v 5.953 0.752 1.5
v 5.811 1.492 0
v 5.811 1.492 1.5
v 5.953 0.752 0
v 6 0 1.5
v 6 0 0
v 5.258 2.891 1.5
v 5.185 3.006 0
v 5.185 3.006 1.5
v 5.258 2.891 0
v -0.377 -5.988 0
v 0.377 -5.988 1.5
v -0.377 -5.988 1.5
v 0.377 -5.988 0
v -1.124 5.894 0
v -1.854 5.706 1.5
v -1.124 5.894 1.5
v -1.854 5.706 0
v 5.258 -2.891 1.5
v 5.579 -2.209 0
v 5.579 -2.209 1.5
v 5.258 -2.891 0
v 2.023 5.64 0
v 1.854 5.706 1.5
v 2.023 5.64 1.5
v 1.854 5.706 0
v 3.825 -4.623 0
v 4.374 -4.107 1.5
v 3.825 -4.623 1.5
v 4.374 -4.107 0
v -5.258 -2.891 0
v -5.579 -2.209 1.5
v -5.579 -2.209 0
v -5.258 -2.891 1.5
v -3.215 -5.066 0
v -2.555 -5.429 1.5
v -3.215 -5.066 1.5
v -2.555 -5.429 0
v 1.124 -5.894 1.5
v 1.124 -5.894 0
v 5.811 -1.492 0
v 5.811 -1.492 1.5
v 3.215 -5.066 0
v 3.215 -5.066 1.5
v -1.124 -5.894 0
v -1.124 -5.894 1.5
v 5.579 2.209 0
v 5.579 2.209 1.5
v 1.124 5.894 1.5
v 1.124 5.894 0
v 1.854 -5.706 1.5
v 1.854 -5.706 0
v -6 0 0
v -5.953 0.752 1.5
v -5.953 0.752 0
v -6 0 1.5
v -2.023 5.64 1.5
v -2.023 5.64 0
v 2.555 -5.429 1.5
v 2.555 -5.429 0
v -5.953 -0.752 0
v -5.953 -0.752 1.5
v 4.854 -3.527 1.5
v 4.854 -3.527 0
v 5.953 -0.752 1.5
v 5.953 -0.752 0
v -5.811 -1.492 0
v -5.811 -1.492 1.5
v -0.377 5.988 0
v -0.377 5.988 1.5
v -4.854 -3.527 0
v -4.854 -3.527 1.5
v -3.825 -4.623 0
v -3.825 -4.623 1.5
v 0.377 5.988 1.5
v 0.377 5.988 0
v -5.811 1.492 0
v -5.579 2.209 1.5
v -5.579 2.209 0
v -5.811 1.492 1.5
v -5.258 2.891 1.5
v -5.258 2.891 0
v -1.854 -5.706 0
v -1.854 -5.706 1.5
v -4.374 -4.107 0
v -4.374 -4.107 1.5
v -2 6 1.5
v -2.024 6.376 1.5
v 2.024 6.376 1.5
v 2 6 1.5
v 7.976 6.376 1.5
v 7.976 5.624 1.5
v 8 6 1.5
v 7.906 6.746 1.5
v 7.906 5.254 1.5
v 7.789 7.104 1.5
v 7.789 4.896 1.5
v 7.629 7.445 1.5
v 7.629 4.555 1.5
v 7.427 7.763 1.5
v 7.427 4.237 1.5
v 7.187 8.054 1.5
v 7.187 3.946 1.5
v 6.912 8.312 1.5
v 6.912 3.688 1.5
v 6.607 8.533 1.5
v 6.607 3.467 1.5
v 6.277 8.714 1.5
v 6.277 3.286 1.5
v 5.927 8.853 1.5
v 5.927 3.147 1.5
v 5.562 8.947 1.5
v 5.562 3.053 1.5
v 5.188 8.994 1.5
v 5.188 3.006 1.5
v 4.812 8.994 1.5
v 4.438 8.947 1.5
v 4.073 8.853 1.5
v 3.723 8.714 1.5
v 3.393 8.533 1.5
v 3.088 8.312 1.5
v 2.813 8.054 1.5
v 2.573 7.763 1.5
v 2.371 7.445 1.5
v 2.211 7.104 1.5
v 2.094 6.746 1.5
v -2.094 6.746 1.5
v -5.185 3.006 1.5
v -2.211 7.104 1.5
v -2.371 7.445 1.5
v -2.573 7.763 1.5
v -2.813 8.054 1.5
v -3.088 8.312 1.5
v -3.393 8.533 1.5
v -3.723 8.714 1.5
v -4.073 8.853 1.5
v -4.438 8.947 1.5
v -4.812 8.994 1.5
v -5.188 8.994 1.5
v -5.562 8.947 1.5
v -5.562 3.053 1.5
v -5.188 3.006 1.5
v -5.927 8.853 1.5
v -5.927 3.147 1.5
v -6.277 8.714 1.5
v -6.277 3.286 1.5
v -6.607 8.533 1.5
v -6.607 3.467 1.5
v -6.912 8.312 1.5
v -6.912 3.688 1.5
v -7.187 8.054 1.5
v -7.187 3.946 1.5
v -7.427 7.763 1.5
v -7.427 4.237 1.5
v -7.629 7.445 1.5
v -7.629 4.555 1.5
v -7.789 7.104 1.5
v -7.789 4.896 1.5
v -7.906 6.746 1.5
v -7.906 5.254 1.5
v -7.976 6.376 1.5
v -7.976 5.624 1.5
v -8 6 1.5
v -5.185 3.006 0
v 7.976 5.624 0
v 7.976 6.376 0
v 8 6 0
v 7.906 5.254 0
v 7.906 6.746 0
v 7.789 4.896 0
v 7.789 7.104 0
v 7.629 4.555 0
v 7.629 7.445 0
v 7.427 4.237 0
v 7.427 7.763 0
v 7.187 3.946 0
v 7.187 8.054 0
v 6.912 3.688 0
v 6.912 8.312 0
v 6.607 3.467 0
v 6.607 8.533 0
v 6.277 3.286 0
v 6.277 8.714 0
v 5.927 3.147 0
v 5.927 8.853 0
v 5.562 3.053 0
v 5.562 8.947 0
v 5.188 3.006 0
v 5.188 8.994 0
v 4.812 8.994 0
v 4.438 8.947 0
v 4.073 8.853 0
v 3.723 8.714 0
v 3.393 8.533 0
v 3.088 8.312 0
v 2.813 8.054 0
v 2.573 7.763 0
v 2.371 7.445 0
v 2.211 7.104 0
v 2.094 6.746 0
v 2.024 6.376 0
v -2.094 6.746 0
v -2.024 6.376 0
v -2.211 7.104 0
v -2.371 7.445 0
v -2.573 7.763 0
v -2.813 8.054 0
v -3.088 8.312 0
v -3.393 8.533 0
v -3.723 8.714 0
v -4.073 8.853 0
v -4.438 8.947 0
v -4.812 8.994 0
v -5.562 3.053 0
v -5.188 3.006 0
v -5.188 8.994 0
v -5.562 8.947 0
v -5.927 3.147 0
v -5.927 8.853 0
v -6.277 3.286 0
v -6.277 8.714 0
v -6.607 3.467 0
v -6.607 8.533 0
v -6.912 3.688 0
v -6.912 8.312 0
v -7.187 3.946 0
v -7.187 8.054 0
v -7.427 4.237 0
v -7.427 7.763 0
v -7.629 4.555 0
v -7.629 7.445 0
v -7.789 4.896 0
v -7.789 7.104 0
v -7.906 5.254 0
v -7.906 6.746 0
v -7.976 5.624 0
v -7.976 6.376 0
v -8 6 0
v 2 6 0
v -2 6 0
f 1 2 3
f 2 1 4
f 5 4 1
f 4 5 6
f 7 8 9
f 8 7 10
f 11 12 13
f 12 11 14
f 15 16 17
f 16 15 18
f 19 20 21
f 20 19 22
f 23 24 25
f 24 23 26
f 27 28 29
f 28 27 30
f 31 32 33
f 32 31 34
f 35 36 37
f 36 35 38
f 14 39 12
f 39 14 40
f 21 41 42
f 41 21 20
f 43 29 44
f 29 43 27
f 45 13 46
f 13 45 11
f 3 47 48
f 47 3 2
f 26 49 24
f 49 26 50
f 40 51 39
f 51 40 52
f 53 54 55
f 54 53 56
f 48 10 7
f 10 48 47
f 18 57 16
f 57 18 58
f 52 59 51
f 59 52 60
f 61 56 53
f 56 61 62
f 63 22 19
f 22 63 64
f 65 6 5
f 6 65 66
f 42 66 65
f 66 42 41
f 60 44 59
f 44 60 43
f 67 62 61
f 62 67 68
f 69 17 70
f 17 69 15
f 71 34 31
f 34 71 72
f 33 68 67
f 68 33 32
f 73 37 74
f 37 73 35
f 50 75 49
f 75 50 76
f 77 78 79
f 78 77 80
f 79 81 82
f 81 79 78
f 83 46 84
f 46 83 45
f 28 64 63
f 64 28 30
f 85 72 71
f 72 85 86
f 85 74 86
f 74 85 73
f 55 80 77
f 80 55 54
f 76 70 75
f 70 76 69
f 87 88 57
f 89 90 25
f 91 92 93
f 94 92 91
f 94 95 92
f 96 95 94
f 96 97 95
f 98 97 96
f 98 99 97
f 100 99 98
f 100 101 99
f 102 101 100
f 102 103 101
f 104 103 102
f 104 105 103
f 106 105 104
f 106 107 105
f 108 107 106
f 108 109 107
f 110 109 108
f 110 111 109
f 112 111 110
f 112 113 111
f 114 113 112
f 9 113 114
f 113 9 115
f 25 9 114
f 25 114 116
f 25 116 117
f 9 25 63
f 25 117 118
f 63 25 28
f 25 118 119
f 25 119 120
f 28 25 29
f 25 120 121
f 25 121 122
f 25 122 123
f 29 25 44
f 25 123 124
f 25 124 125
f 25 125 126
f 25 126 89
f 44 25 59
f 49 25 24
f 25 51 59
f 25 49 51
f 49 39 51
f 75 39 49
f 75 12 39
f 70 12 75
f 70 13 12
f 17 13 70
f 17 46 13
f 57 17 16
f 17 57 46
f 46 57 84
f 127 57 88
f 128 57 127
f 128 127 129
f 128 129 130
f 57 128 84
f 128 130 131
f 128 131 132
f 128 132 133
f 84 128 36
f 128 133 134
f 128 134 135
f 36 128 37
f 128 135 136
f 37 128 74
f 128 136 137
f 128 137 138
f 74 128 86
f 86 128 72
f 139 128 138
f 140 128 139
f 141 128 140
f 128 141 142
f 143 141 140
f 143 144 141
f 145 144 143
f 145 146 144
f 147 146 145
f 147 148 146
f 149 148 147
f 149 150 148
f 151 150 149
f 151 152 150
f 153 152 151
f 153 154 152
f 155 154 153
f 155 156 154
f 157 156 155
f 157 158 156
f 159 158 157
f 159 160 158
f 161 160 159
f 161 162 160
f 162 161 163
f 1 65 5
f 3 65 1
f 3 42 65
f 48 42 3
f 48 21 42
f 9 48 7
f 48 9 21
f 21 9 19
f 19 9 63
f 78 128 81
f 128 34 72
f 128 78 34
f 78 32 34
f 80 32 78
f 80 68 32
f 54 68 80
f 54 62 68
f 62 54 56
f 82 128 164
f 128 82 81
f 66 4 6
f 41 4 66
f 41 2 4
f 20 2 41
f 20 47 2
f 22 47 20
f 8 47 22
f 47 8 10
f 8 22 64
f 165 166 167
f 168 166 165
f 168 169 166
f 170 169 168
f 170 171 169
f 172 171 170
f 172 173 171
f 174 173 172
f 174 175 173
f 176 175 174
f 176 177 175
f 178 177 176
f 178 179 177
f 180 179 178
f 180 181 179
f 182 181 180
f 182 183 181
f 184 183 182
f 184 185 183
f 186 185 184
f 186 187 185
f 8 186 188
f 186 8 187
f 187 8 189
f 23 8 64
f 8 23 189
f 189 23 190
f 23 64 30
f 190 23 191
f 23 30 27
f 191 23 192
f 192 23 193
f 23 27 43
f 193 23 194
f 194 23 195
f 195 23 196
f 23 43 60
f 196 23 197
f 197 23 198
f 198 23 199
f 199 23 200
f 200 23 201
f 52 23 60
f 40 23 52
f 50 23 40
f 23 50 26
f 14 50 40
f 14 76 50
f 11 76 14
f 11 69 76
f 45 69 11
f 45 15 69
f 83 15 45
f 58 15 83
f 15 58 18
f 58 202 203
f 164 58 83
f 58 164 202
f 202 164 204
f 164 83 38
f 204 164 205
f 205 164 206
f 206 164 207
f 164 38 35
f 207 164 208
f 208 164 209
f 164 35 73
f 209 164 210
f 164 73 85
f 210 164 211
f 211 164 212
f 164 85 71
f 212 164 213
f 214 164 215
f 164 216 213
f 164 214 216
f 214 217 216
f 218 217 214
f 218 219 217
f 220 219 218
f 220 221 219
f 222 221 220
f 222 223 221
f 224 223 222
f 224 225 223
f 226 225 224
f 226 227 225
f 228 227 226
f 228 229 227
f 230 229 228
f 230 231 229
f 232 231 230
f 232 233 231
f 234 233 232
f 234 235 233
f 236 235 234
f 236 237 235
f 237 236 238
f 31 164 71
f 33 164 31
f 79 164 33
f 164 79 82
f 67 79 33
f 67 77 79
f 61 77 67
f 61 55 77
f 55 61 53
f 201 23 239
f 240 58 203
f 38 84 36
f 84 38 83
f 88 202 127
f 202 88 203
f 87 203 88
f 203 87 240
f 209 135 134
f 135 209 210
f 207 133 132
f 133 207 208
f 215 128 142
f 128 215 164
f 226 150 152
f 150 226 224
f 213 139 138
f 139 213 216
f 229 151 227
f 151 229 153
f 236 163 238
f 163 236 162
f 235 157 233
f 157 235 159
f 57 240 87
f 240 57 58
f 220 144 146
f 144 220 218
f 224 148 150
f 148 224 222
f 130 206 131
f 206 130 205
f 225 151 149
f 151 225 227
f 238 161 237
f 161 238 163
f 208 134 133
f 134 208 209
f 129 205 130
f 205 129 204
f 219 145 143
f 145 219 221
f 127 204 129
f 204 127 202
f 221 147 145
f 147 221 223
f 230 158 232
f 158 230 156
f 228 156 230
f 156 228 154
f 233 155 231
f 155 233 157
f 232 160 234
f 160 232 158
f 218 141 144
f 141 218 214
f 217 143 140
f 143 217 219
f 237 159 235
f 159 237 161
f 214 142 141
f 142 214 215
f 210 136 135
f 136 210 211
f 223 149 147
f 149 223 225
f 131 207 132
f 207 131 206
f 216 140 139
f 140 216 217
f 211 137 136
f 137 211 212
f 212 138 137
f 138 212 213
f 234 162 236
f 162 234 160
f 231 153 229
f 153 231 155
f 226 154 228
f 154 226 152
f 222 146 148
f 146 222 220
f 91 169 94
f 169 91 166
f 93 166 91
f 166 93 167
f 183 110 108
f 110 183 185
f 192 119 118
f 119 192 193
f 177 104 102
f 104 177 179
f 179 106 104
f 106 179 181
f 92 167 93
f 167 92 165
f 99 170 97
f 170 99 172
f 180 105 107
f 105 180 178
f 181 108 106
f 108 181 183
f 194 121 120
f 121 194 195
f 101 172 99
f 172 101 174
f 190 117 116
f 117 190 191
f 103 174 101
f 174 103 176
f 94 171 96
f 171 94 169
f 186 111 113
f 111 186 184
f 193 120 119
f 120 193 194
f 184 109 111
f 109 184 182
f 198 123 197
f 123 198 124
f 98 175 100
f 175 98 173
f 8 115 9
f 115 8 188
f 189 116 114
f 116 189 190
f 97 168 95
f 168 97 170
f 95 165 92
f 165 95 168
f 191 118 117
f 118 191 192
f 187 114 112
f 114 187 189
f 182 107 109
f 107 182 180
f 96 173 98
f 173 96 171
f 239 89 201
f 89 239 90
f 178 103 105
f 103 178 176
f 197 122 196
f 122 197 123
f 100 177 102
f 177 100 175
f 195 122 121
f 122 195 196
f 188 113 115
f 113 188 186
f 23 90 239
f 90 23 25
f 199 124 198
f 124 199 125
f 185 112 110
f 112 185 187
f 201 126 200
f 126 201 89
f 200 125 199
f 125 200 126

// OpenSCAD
union() {
	$fn=50;
	$thickness=1.5;
	cylinder(h=$thickness, d=12);
	translate([-5, 6, 0])
		cylinder(h=$thickness, d=6);
	translate([5, 6, 0])
		cylinder(h=$thickness, d=6);
}
